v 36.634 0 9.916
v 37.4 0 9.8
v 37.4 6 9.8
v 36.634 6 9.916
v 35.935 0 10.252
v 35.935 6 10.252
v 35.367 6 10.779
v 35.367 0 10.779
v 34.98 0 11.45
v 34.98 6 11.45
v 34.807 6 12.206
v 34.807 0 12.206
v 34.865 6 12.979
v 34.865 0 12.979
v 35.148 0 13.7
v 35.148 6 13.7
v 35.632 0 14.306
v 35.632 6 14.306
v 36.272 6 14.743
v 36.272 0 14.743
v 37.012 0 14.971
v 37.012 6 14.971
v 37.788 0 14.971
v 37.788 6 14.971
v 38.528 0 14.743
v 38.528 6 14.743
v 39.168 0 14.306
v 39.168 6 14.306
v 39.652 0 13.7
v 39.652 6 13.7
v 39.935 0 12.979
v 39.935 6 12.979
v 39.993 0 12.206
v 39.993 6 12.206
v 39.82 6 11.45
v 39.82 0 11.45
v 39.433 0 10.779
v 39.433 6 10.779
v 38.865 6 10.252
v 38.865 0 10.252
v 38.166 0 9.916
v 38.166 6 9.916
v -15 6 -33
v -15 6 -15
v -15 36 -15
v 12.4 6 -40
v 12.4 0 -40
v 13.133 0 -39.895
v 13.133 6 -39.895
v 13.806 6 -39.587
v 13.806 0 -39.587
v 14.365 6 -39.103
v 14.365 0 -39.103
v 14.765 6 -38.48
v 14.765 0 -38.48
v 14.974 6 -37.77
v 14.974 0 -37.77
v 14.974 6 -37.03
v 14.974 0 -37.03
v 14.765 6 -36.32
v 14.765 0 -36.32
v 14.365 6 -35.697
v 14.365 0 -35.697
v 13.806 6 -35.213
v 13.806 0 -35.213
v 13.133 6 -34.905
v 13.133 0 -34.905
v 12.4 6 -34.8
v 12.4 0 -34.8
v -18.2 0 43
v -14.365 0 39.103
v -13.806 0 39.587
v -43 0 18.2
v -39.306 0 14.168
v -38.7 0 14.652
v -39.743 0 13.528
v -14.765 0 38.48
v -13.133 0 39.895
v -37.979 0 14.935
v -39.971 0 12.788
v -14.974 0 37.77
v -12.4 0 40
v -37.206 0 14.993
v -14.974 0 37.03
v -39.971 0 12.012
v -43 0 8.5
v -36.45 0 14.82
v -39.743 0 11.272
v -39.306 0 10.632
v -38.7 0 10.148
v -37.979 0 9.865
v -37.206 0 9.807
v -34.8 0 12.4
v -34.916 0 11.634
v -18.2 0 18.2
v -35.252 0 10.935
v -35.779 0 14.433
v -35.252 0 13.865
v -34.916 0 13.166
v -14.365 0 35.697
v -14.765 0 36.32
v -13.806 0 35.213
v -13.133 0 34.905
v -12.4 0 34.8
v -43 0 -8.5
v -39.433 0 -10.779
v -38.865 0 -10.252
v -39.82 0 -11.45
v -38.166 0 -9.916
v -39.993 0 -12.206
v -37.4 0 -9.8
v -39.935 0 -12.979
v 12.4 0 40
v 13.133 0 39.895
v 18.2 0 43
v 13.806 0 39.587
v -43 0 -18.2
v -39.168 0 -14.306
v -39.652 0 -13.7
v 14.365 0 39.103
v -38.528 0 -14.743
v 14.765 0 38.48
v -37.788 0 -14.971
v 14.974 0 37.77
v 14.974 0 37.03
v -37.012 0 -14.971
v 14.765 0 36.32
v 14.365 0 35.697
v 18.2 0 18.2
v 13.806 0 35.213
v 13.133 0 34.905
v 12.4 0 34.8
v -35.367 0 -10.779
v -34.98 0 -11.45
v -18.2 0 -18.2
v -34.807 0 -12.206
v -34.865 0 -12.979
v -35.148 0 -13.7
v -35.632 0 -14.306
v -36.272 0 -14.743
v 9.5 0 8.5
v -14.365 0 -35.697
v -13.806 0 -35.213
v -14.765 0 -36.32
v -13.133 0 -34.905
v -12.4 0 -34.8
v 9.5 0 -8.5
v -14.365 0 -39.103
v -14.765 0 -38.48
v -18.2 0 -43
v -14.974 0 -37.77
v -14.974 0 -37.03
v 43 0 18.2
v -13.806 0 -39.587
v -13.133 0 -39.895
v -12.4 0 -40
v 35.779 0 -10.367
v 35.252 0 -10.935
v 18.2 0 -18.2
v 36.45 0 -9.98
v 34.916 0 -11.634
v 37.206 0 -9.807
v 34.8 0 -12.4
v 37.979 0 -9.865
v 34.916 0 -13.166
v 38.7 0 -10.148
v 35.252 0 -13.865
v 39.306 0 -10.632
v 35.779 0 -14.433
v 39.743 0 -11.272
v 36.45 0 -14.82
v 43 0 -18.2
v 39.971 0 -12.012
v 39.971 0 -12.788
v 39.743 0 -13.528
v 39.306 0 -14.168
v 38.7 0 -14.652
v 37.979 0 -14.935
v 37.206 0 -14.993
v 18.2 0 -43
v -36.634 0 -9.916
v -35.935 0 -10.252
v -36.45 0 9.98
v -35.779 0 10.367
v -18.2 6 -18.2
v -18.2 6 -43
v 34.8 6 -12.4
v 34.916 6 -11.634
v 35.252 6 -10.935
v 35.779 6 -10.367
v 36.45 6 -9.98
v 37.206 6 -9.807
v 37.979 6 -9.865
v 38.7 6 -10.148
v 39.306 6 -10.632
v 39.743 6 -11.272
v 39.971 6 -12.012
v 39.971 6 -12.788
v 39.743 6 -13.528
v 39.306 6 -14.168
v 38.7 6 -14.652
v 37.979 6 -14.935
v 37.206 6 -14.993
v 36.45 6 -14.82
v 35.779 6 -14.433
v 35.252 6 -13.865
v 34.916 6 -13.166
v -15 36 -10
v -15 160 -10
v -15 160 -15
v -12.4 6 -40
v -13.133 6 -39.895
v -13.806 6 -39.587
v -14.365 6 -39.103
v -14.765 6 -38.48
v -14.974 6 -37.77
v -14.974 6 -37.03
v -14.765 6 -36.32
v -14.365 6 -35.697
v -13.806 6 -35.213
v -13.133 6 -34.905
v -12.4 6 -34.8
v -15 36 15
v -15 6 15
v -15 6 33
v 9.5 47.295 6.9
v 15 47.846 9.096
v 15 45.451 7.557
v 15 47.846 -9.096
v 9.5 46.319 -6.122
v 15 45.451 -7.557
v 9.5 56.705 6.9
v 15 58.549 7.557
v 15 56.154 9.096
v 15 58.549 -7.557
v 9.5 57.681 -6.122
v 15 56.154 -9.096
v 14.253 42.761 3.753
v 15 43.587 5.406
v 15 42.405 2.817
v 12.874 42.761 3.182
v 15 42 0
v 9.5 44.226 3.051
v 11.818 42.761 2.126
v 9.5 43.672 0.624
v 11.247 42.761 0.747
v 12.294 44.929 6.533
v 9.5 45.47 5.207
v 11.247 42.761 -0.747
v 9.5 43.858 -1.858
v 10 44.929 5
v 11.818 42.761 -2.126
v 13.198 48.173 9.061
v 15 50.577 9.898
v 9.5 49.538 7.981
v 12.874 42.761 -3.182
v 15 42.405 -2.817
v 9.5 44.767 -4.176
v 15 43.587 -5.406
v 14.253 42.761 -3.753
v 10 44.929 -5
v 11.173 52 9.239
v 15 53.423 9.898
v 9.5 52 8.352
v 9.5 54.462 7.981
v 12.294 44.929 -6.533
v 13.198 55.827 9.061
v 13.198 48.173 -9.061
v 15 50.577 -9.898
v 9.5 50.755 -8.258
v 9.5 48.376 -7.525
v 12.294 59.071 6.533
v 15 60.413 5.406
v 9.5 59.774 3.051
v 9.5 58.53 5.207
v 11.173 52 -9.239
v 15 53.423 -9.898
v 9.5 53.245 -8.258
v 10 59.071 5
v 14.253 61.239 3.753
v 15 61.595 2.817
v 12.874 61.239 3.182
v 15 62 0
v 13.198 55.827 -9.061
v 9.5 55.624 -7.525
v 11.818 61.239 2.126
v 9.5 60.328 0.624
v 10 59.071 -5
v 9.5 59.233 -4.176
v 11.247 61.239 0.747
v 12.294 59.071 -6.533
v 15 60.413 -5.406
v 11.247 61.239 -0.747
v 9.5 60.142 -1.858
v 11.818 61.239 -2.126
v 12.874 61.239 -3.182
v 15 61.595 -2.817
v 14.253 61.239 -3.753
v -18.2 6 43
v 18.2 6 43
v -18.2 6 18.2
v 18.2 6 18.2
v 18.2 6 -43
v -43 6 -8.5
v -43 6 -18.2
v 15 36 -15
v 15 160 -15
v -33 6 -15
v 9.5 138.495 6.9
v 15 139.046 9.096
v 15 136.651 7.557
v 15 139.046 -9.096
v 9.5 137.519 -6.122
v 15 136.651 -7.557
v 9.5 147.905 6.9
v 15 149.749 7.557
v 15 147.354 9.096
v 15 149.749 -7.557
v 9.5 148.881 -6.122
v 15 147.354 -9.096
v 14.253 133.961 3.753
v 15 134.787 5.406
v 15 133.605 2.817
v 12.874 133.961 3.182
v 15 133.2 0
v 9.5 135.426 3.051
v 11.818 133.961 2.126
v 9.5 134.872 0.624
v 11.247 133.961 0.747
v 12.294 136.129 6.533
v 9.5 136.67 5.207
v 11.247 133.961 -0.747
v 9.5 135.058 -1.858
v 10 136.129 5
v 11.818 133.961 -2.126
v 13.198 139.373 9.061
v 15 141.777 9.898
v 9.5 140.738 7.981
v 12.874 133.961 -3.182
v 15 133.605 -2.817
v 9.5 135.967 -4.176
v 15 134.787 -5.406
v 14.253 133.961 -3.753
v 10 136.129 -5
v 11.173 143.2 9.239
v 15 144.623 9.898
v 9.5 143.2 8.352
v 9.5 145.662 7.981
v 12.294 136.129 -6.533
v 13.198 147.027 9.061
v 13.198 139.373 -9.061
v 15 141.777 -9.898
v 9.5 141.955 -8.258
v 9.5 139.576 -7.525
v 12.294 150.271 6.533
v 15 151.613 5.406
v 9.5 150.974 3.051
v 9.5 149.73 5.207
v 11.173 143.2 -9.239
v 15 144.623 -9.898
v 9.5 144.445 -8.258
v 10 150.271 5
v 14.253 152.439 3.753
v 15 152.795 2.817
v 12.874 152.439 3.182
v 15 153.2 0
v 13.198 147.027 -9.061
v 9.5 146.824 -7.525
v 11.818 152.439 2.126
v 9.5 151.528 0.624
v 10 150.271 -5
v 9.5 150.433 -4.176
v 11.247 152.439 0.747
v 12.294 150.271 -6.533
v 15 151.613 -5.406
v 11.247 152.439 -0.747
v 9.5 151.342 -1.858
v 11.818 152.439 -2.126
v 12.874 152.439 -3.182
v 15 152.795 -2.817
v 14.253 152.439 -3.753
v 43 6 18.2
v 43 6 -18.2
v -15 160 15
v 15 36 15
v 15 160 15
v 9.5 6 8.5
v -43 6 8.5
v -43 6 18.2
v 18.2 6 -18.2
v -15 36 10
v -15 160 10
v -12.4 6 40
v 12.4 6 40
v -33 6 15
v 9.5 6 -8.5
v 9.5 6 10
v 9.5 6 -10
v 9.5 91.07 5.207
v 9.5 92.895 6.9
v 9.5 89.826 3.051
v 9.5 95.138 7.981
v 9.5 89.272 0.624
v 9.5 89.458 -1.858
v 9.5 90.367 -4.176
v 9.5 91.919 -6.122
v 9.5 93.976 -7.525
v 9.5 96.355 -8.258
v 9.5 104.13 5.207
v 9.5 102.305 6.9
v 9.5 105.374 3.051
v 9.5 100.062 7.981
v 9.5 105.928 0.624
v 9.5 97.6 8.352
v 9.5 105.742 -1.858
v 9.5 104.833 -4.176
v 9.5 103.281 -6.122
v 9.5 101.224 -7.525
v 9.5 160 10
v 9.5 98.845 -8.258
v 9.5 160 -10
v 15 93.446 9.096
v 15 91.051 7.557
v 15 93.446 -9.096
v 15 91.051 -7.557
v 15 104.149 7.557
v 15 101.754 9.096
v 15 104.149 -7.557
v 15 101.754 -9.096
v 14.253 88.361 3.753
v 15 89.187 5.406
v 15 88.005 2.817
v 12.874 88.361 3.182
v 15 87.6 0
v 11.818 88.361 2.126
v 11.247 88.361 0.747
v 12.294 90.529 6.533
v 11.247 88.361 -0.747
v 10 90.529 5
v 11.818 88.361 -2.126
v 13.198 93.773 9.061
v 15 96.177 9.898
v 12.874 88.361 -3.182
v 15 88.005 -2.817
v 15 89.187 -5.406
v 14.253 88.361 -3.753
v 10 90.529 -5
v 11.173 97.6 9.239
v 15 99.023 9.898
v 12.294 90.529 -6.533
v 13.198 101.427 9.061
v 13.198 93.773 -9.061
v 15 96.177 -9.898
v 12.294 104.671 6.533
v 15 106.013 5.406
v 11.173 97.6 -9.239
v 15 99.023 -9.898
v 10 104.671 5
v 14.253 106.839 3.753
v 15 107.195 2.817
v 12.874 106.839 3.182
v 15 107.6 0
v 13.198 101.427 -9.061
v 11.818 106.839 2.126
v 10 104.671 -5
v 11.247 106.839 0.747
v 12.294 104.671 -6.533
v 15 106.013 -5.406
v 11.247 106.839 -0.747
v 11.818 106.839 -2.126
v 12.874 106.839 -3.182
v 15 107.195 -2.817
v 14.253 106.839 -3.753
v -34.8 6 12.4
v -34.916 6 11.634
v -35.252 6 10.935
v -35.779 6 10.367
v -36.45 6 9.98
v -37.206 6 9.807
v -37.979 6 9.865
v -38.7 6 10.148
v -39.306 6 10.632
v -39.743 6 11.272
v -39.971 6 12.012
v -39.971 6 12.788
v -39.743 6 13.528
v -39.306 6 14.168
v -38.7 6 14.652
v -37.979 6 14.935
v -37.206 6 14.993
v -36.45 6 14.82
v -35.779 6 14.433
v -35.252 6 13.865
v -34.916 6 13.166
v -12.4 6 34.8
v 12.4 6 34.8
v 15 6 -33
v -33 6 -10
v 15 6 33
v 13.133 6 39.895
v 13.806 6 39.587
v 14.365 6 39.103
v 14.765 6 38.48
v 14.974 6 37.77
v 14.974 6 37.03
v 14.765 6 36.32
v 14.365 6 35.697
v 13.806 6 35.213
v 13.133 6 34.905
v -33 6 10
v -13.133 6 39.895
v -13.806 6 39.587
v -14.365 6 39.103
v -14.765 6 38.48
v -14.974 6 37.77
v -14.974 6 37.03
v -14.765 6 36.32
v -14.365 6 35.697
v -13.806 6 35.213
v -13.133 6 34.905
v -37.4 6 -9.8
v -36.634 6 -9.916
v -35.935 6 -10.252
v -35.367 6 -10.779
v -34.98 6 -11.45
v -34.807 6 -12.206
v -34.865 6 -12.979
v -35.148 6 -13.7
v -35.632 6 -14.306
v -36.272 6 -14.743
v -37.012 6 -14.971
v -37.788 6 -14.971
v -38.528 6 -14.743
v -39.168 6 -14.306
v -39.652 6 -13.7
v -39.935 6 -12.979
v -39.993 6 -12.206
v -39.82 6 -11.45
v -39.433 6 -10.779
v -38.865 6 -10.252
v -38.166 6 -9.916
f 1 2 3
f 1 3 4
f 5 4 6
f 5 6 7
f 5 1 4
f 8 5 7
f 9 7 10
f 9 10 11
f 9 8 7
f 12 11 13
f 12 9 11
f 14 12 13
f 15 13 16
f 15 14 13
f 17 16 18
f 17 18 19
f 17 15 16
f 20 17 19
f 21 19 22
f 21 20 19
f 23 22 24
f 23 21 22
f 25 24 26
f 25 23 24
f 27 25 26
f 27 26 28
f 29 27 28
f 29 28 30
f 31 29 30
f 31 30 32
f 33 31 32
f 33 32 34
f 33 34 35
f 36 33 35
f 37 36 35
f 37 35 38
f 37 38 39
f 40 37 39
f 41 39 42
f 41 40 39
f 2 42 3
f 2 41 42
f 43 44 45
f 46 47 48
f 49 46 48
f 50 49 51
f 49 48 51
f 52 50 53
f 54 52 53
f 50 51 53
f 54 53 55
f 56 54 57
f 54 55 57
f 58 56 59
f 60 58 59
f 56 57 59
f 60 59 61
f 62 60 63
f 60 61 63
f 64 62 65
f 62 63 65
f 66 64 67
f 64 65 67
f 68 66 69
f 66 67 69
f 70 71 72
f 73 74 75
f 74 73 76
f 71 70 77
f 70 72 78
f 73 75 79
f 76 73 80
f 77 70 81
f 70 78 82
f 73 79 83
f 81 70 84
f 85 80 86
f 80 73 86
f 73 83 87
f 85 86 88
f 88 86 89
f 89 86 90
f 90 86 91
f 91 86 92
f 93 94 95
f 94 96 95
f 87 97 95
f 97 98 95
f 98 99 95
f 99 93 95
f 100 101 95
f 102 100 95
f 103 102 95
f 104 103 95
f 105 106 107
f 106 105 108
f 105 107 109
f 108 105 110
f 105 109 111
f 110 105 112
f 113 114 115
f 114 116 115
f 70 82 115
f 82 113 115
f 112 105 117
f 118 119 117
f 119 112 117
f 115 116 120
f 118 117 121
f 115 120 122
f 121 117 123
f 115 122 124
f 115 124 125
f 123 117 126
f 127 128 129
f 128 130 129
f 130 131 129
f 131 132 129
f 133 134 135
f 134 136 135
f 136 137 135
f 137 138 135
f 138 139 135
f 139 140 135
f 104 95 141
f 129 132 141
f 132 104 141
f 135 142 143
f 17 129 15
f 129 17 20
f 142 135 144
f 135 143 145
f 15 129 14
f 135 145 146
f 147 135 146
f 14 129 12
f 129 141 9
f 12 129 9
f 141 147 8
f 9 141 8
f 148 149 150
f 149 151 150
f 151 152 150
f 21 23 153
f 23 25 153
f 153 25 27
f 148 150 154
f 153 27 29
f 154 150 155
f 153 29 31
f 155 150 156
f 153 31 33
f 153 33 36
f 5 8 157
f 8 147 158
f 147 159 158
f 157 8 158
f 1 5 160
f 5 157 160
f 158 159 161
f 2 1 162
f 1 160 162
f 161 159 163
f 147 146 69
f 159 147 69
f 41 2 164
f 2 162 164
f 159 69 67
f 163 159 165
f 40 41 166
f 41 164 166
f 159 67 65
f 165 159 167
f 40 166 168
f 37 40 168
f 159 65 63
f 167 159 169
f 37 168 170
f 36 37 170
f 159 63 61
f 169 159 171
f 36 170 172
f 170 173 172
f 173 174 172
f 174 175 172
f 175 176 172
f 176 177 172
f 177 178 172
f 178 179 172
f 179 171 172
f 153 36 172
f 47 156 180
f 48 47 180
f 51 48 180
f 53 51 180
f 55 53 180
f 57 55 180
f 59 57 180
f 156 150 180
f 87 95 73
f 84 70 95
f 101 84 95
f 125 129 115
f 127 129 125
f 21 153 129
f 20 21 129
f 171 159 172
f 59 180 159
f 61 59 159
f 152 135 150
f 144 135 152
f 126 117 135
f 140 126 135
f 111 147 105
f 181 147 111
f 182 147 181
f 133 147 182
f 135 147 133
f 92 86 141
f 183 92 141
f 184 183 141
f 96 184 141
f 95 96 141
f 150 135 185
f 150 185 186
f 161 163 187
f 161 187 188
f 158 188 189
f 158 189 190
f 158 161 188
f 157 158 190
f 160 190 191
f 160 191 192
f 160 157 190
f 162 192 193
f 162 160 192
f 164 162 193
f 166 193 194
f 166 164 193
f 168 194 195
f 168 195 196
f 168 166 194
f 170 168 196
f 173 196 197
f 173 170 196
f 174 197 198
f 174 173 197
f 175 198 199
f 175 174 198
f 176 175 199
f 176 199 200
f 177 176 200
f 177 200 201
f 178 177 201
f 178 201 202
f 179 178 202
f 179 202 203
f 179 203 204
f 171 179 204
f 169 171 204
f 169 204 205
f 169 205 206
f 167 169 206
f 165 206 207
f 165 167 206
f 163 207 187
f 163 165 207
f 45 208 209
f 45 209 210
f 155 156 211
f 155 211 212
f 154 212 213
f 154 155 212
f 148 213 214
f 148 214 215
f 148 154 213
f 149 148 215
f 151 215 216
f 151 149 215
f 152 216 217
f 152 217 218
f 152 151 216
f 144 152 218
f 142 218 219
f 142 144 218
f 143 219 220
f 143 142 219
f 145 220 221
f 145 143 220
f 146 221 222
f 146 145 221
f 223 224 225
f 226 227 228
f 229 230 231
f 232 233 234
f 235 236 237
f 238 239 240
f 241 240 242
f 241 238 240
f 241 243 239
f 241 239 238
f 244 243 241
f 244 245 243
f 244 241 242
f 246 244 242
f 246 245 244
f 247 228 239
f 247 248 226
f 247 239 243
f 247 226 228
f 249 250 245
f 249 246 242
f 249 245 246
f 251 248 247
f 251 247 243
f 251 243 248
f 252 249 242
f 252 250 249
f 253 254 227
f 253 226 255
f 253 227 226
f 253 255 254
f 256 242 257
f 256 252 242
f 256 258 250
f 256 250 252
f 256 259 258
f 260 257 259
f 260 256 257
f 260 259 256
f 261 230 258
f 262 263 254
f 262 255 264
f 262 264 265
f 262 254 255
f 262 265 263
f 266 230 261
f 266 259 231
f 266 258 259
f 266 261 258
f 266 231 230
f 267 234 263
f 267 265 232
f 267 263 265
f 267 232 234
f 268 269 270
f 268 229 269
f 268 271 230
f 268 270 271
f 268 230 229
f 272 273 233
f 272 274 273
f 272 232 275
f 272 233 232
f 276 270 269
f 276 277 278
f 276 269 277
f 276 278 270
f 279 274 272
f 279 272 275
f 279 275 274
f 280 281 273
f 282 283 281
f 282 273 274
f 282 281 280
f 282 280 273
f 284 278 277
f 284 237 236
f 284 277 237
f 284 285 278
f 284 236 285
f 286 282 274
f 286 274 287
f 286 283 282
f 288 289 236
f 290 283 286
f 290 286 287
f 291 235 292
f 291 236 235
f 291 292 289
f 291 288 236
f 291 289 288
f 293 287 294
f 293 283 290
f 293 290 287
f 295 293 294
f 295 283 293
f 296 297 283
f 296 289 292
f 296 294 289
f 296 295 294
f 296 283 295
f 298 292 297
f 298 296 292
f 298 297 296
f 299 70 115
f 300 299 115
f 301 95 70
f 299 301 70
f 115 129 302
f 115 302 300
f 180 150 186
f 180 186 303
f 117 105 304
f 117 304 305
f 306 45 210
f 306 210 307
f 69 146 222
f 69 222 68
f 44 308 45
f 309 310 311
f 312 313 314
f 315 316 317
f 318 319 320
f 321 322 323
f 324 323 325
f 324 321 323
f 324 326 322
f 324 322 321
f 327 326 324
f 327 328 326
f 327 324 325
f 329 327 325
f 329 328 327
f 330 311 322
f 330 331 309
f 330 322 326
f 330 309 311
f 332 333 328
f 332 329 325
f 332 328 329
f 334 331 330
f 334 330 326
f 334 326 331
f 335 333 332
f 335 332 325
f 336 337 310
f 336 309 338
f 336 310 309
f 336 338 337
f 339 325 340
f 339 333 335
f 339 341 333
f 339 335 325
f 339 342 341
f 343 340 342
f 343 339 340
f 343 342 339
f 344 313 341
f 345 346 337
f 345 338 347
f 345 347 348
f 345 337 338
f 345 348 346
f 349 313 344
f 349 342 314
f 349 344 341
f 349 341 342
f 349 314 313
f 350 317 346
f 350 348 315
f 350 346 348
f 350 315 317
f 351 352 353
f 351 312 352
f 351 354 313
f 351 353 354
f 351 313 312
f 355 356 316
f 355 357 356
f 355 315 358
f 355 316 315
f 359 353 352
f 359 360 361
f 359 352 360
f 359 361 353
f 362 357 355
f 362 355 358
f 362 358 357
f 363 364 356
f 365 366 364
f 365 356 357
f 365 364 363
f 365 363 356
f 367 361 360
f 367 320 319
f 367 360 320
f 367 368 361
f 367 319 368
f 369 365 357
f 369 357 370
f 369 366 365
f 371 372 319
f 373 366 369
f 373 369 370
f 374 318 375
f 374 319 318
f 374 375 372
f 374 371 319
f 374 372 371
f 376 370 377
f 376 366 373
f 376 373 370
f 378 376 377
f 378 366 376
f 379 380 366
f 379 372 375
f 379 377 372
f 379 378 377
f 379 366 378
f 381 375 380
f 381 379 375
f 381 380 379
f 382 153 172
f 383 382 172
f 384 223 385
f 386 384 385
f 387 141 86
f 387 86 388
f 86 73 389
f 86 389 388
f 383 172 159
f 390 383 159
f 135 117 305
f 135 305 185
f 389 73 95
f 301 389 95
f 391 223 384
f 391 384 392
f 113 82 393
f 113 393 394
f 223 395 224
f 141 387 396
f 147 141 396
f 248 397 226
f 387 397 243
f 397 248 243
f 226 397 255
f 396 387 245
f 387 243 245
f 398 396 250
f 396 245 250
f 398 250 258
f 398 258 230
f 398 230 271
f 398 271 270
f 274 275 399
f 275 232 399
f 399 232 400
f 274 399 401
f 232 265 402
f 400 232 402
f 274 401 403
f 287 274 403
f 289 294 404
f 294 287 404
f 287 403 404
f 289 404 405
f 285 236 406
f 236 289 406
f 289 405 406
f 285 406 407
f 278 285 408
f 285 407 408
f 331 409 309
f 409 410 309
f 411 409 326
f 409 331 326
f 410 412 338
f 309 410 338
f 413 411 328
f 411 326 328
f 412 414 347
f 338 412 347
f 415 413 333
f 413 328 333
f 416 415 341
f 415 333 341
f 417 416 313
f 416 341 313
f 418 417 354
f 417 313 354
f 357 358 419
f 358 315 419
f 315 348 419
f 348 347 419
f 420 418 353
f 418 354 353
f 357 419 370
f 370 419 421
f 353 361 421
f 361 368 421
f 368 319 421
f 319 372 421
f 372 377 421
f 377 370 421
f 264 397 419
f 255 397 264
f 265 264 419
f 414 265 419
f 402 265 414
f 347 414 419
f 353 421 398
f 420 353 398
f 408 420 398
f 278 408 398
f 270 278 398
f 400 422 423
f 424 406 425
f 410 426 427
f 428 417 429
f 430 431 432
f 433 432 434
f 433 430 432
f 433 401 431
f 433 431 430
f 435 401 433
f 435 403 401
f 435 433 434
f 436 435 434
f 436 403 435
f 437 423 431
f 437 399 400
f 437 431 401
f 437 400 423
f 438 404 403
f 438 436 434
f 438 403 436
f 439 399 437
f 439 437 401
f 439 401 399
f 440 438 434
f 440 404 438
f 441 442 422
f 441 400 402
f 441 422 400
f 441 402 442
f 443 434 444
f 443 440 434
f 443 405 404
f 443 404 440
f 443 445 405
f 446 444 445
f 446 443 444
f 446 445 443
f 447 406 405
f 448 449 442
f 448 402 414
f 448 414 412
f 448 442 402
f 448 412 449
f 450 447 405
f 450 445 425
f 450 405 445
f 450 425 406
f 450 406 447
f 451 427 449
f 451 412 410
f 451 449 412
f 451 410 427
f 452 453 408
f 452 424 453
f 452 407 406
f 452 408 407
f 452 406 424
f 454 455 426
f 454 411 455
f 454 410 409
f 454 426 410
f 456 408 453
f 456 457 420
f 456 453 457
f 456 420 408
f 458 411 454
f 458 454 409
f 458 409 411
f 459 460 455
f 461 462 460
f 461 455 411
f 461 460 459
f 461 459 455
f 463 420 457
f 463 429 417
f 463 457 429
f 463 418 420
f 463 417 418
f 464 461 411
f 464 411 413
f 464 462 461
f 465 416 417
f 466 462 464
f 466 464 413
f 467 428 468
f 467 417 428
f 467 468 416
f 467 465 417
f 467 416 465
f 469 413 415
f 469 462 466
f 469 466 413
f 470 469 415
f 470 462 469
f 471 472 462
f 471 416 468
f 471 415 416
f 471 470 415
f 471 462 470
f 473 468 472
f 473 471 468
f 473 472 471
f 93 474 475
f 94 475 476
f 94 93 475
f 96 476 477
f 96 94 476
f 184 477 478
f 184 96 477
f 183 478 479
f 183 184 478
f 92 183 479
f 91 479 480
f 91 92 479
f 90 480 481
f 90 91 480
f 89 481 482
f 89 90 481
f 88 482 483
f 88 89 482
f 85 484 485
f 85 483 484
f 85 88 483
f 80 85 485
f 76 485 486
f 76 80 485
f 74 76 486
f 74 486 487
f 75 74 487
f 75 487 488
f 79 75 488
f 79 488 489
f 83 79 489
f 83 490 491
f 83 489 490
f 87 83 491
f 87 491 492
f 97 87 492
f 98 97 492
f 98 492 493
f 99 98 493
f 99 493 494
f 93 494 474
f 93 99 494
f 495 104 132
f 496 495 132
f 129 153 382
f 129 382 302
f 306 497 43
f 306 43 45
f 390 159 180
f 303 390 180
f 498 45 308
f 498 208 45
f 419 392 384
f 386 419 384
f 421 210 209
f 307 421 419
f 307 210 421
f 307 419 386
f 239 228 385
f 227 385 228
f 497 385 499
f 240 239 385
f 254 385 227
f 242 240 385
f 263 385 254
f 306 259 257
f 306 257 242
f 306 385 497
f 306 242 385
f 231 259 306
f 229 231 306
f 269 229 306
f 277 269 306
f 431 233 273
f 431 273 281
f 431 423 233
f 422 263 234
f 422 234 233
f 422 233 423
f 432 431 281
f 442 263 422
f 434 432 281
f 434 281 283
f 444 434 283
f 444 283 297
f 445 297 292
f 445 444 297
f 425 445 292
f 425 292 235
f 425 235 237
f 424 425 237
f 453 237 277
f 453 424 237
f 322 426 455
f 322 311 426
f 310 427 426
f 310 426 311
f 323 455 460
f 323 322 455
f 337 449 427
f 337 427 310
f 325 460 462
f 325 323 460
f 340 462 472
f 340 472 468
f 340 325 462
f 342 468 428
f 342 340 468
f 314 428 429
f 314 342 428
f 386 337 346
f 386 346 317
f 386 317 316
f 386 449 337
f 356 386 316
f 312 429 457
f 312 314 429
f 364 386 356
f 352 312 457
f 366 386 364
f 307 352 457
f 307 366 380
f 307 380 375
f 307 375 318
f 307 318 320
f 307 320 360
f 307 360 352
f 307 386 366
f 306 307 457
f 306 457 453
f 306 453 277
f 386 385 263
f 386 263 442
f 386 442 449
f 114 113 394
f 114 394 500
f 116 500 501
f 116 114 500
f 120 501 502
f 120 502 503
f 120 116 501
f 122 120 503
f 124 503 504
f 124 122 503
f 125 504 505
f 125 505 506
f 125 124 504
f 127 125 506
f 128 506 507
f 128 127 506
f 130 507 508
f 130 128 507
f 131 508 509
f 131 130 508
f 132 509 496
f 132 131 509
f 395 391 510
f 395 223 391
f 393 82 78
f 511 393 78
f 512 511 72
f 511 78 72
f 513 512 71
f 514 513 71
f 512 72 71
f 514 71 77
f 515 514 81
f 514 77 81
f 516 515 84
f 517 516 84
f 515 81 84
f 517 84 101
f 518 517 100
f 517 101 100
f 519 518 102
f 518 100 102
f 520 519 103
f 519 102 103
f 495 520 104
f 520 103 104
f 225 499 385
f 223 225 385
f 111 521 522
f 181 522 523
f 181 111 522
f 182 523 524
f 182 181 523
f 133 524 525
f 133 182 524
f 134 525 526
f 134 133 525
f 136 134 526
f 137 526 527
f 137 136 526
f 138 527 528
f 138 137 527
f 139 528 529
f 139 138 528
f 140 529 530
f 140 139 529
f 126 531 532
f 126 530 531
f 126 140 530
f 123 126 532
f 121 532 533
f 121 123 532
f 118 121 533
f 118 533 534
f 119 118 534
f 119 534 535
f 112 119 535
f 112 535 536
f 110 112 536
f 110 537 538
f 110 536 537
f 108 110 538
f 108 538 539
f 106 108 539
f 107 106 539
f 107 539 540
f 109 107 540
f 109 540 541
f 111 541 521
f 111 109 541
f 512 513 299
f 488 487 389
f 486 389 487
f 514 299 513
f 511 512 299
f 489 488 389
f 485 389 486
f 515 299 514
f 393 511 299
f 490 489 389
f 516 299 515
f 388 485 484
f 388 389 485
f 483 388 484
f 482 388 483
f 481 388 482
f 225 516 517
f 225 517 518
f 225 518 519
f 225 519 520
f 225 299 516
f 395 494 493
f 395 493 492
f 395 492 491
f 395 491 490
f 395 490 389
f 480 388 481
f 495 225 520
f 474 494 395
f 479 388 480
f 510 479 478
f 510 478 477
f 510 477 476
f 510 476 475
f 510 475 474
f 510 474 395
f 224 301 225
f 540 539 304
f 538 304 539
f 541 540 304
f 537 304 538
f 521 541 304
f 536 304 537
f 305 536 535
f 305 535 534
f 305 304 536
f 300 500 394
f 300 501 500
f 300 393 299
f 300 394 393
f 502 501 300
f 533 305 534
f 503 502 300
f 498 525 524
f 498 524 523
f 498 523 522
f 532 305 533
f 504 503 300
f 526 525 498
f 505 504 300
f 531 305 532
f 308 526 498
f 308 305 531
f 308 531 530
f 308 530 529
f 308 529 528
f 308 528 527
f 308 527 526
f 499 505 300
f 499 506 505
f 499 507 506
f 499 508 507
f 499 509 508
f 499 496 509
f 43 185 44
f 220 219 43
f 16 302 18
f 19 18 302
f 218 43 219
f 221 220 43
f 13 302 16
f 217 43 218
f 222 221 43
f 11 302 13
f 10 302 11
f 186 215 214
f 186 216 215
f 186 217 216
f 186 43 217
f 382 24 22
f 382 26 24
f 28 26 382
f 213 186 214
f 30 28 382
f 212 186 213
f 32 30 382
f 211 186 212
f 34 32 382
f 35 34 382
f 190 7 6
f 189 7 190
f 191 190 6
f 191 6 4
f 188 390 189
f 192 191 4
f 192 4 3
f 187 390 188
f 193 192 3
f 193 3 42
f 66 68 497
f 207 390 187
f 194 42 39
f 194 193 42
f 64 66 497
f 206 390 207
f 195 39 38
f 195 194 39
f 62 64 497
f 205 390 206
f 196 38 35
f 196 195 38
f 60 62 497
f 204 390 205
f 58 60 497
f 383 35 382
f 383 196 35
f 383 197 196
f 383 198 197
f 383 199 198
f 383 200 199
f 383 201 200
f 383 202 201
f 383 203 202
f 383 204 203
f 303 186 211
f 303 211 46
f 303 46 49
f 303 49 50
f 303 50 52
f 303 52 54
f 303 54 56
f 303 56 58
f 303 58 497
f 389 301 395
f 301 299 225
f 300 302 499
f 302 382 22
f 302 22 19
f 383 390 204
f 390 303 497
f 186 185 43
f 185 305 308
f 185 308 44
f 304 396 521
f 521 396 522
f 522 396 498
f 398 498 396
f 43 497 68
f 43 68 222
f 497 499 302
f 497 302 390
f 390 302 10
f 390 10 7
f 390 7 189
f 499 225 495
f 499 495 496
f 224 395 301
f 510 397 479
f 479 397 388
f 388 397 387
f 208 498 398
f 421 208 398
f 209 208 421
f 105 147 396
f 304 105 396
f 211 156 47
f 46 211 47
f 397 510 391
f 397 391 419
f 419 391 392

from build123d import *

# Parameters (mm, degrees)
SKETCH_1_W                  = 86
SKETCH_1_H                  = 86
EXTRUDE_1_DEPTH             = 6
SKETCH_2_W                  = 30
SKETCH_2_H                  = 30
EXTRUDE_2_DEPTH             = 160
EXTRUDE_3_REACH             = 173.167
EXTRUDE_3_DIRECTION_2_REACH = 173.167
SKETCH_8_R                  = 2.6
CUT_EXTRUDE_2_DEPTH         = 6
CUT_EXTRUDE_3_DEPTH         = 6
PATTERN_LINEAR_1_COUNT      = 3
PATTERN_LINEAR_1_PITCH      = 45.6
MIRROR_7_COPY_1_DEPTH       = 6
MIRROR_8_COPY_1_SKETCH_R    = 2.6
MIRROR_8_COPY_1_DEPTH       = 6
PATTERN_CIRCULAR_1_COUNT    = 2
PATTERN_CIRCULAR_1_ANGLE    = 90
MIRROR_9_COPY_1_SKETCH_R    = 2.6
MIRROR_9_COPY_1_DEPTH       = 6
MIRROR_9_COPY_2_SKETCH_R    = 2.6
MIRROR_9_COPY_2_DEPTH       = 6
MIRROR_10_COPY_1_SKETCH_R   = 2.6
MIRROR_10_COPY_1_DEPTH      = 6
MIRROR_10_COPY_2_SKETCH_R   = 2.6
MIRROR_10_COPY_2_DEPTH      = 6
MIRROR_10_COPY_3_SKETCH_R   = 2.6
MIRROR_10_COPY_3_DEPTH      = 6
MIRROR_10_COPY_4_SKETCH_R   = 2.6
MIRROR_10_COPY_4_DEPTH      = 6
MIRROR_10_COPY_5_SKETCH_R   = 2.6
MIRROR_10_COPY_5_DEPTH      = 6
EXTRUDE_4_DEPTH             = 15
CUT_EXTRUDE_4_DEPTH         = 9.5
CUT_EXTRUDE_4_DEPTH_BACK    = 172.166585524
SKETCH_17_W                 = 20
SKETCH_17_H                 = 154
SKETCH_19_W                 = 24.8
SKETCH_19_H                 = 5.2
CUT_EXTRUDE_6_DEPTH         = 172.166585524
CUT_EXTRUDE_8_DEPTH         = 9.5
CUT_EXTRUDE_8_DEPTH_BACK    = 172.166585524
SKETCH_21_W                 = 17
SKETCH_21_H                 = 6


with BuildPart() as part:
    # 草图1 → 凸台-拉伸1 (new body)
    with BuildSketch(Plane(origin=(0, 0, 0), x_dir=(1, 0, 0), z_dir=(0, 1, 0))):
        Rectangle(SKETCH_1_W, SKETCH_1_H)
    extrude(amount=EXTRUDE_1_DEPTH)

    # 草图2 → 凸台-拉伸2 (add)
    with BuildSketch(Plane(origin=(0, 0, 0), x_dir=(1, 0, 0), z_dir=(0, 1, 0))):
        Rectangle(SKETCH_2_W, SKETCH_2_H)
    extrude(amount=EXTRUDE_2_DEPTH)

    # 凸台-拉伸3: up to this face of the body (flat: up to its plane)
    extrude_3_end = Plane(part.part.faces().sort_by_distance((0, 83, 15))[0])
    # 草图7 → 凸台-拉伸3 (add, up to the picked face)
    with BuildSketch(Plane.XY, mode=Mode.PRIVATE) as extrude_3_sk1:
        Polygon((-15, 36), (-33, 6), (-15, 6), align=None)
    extrude_3_tool1 = split(extrude(extrude_3_sk1.sketch, amount=EXTRUDE_3_REACH, mode=Mode.PRIVATE), bisect_by=extrude_3_end, keep=Keep.BOTH, mode=Mode.PRIVATE)
    add(extrude_3_tool1.solids().sort_by(Axis((-21, 16, 0), (0, 0, 1)))[0])

    # 凸台-拉伸3 direction 2: up to this face of the body (flat: up to its plane)
    extrude_3_direction_2_end = Plane(part.part.faces().sort_by_distance((0, 83, -15))[0])
    # 草图7 → 凸台-拉伸3 direction 2 (add, up to the picked face)
    with BuildSketch(Plane.XY, mode=Mode.PRIVATE) as extrude_3_direction_2_sk1:
        Polygon((-15, 36), (-33, 6), (-15, 6), align=None)
    extrude_3_direction_2_tool1 = split(extrude(extrude_3_direction_2_sk1.sketch, amount=-EXTRUDE_3_DIRECTION_2_REACH, mode=Mode.PRIVATE), bisect_by=extrude_3_direction_2_end, keep=Keep.BOTH, mode=Mode.PRIVATE)
    add(extrude_3_direction_2_tool1.solids().sort_by(Axis((-21, 16, 0), (0, 0, -1)))[0])

    # 草图8 → 切除-拉伸2 (cut)
    with BuildSketch(Plane(origin=(0, 0, 0), x_dir=(1, 0, 0), z_dir=(0, 1, 0))):
        with Locations(Location((-12.4, 37.4, 0), (0, 0, 270))):
            Circle(SKETCH_8_R)
    cut_extrude_2 = extrude(amount=CUT_EXTRUDE_2_DEPTH, mode=Mode.SUBTRACT)

    # 镜向2: 切除-拉伸2 across plane
    add(cut_extrude_2.mirror(Plane.XY), mode=Mode.SUBTRACT)

    # 草图11 → 切除-拉伸3 (cut)
    with BuildSketch(Plane(origin=(0, 0, 0), x_dir=(1, 0, 0), z_dir=(0, 1, 0))):
        Polygon((264.106039705, -18.2), (43, -18.2), (18.2, -18.2), (18.2, -43), (18.2, -264.106039705), (330.891160074, -576.797199779), (576.797199779, -330.891160074), align=None)
    cut_extrude_3 = extrude(amount=CUT_EXTRUDE_3_DEPTH, mode=Mode.SUBTRACT)

    # 草图12 → 切除-旋转2 (revolve, cut)
    with BuildSketch(Plane.XY):
        with BuildLine():
            Line((15, 62), (15, 42))
            ThreePointArc((15, 42), (5, 52), (15, 62))
        make_face()
    cut_revolve_2 = revolve(axis=Axis((15, 62, 0), (0, -1, 0)), mode=Mode.SUBTRACT)

    # 阵列(线性)1: 切除-旋转2 ×3
    with Locations(*[(0, i * PATTERN_LINEAR_1_PITCH, 0) for i in range(1, PATTERN_LINEAR_1_COUNT)]):
        add(cut_revolve_2, mode=Mode.SUBTRACT)

    # 镜向6: 切除-拉伸3 across plane
    add(cut_extrude_3.mirror(Plane.XY), mode=Mode.SUBTRACT)

    # 镜向7: 切除-拉伸3 across plane
    add(cut_extrude_3.mirror(Plane(origin=(0, 0, 0), x_dir=(0, 0, 1), z_dir=(1, 0, 0))), mode=Mode.SUBTRACT)

    # 镜向7 copy 1 sketch → 镜向7 copy 1 (cut)
    with BuildSketch(Plane(origin=(0, 0, 0), x_dir=(-1, 0, 0), z_dir=(0, 1, 0))):
        Polygon((264.106039705, -18.2), (43, -18.2), (18.2, -18.2), (18.2, -43), (18.2, -264.106039705), (330.891160074, -576.797199779), (576.797199779, -330.891160074), align=None)
    extrude(amount=MIRROR_7_COPY_1_DEPTH, mode=Mode.SUBTRACT)

    # 镜向8: 切除-拉伸2 across plane
    add(cut_extrude_2.mirror(Plane(origin=(0, 0, 0), x_dir=(0, 0, 1), z_dir=(1, 0, 0))), mode=Mode.SUBTRACT)

    # 镜向8 copy 1 sketch → 镜向8 copy 1 (cut)
    with BuildSketch(Plane(origin=(0, 0, 0), x_dir=(-1, 0, 0), z_dir=(0, 1, 0))):
        with Locations(Location((-12.4, 37.4, 0), (0, 0, 270))):
            Circle(MIRROR_8_COPY_1_SKETCH_R)
    extrude(amount=MIRROR_8_COPY_1_DEPTH, mode=Mode.SUBTRACT)

    # 阵列(圆周)1: 切除-拉伸2 ×2 about axis
    pattern_circular_1_axis = Axis((0, 0, 0), (0, 1, 0))
    for i in range(1, PATTERN_CIRCULAR_1_COUNT):
        add(cut_extrude_2.rotate(pattern_circular_1_axis, i * PATTERN_CIRCULAR_1_ANGLE / (PATTERN_CIRCULAR_1_COUNT - 1)), mode=Mode.SUBTRACT)

    # 镜向9 copy 1 sketch → 镜向9 copy 1 (cut)
    with BuildSketch(Plane.ZX):
        with Locations((-12.4, -37.4)):
            Circle(MIRROR_9_COPY_1_SKETCH_R)
    extrude(amount=MIRROR_9_COPY_1_DEPTH, mode=Mode.SUBTRACT)

    # 镜向9 copy 2 sketch → 镜向9 copy 2 (cut)
    with BuildSketch(Plane(origin=(0, 0, 0), x_dir=(1, 0, 0), z_dir=(0, 1, 0))):
        with Locations((-12.4, -37.4)):
            Circle(MIRROR_9_COPY_2_SKETCH_R)
    extrude(amount=MIRROR_9_COPY_2_DEPTH, mode=Mode.SUBTRACT)

    # 镜向10 copy 1 sketch → 镜向10 copy 1 (cut)
    with BuildSketch(Plane(origin=(0, 0, 0), x_dir=(0, 0, -1), z_dir=(0, 1, 0))):
        with Locations((-12.4, -37.4)):
            Circle(MIRROR_10_COPY_1_SKETCH_R)
    extrude(amount=MIRROR_10_COPY_1_DEPTH, mode=Mode.SUBTRACT)

    # 镜向10 copy 2 sketch → 镜向10 copy 2 (cut)
    with BuildSketch(Plane(origin=(0, 0, 0), x_dir=(-1, 0, 0), z_dir=(0, 1, 0))):
        with Locations((-12.4, -37.4)):
            Circle(MIRROR_10_COPY_2_SKETCH_R)
    extrude(amount=MIRROR_10_COPY_2_DEPTH, mode=Mode.SUBTRACT)

    # 镜向10 copy 3 sketch → 镜向10 copy 3 (cut)
    with BuildSketch(Plane.ZX):
        with Locations(Location((-12.4, 37.4, 0), (0, 0, 270))):
            Circle(MIRROR_10_COPY_3_SKETCH_R)
    extrude(amount=MIRROR_10_COPY_3_DEPTH, mode=Mode.SUBTRACT)

    # 镜向10 copy 4 sketch → 镜向10 copy 4 (cut)
    with BuildSketch(Plane(origin=(0, 0, 0), x_dir=(-1, 0, 0), z_dir=(0, 1, 0))):
        with Locations(Location((-12.4, 37.4, 0), (0, 0, 270))):
            Circle(MIRROR_10_COPY_4_SKETCH_R)
    extrude(amount=MIRROR_10_COPY_4_DEPTH, mode=Mode.SUBTRACT)

    # 镜向10 copy 5 sketch → 镜向10 copy 5 (cut)
    with BuildSketch(Plane(origin=(0, 0, 0), x_dir=(-1, 0, 0), z_dir=(0, 1, 0))):
        with Locations((-12.4, -37.4)):
            Circle(MIRROR_10_COPY_5_SKETCH_R)
    extrude(amount=MIRROR_10_COPY_5_DEPTH, mode=Mode.SUBTRACT)

    # 草图15 → 凸台-拉伸4 (add, symmetric)
    with BuildSketch(Plane(origin=(0, 0, 0), x_dir=(0, 0, -1), z_dir=(1, 0, 0))):
        Polygon((-15, 36), (-15, 6), (-33, 6), align=None)
    extrude_4 = extrude(amount=EXTRUDE_4_DEPTH, both=True)

    # 镜向11: 凸台-拉伸4 across plane
    add(extrude_4.mirror(Plane.XY))

    # 草图17 → 切除-拉伸4 (cut, two sides: drawn at the far end of the back side and taken through both)
    with BuildSketch(Plane(origin=(0, 0, 0), x_dir=(0, 0, -1), z_dir=(1, 0, 0)).offset(-CUT_EXTRUDE_4_DEPTH_BACK)):
        with Locations((0, 83)):
            Rectangle(SKETCH_17_W, SKETCH_17_H)
    extrude(amount=CUT_EXTRUDE_4_DEPTH + CUT_EXTRUDE_4_DEPTH_BACK, mode=Mode.SUBTRACT)

    # 草图19 → 切除-拉伸6 (cut, through all)
    with BuildSketch(Plane(origin=(0, 0, 0), x_dir=(1, 0, 0), z_dir=(0, 1, 0))):
        with Locations((0, 37.4)):
            Rectangle(SKETCH_19_W, SKETCH_19_H)
    cut_extrude_6 = extrude(amount=CUT_EXTRUDE_6_DEPTH, mode=Mode.SUBTRACT)

    # 镜向12: 切除-拉伸6 across plane
    add(cut_extrude_6.mirror(Plane.XY), mode=Mode.SUBTRACT)

    # 草图21 → 切除-拉伸8 (cut, two sides: drawn at the far end of the back side and taken through both)
    with BuildSketch(Plane(origin=(0, 0, 0), x_dir=(0, 0, -1), z_dir=(1, 0, 0)).offset(-CUT_EXTRUDE_8_DEPTH_BACK)):
        with Locations((0, 3)):
            Rectangle(SKETCH_21_W, SKETCH_21_H)
    extrude(amount=CUT_EXTRUDE_8_DEPTH + CUT_EXTRUDE_8_DEPTH_BACK, mode=Mode.SUBTRACT)


solid = part.part
